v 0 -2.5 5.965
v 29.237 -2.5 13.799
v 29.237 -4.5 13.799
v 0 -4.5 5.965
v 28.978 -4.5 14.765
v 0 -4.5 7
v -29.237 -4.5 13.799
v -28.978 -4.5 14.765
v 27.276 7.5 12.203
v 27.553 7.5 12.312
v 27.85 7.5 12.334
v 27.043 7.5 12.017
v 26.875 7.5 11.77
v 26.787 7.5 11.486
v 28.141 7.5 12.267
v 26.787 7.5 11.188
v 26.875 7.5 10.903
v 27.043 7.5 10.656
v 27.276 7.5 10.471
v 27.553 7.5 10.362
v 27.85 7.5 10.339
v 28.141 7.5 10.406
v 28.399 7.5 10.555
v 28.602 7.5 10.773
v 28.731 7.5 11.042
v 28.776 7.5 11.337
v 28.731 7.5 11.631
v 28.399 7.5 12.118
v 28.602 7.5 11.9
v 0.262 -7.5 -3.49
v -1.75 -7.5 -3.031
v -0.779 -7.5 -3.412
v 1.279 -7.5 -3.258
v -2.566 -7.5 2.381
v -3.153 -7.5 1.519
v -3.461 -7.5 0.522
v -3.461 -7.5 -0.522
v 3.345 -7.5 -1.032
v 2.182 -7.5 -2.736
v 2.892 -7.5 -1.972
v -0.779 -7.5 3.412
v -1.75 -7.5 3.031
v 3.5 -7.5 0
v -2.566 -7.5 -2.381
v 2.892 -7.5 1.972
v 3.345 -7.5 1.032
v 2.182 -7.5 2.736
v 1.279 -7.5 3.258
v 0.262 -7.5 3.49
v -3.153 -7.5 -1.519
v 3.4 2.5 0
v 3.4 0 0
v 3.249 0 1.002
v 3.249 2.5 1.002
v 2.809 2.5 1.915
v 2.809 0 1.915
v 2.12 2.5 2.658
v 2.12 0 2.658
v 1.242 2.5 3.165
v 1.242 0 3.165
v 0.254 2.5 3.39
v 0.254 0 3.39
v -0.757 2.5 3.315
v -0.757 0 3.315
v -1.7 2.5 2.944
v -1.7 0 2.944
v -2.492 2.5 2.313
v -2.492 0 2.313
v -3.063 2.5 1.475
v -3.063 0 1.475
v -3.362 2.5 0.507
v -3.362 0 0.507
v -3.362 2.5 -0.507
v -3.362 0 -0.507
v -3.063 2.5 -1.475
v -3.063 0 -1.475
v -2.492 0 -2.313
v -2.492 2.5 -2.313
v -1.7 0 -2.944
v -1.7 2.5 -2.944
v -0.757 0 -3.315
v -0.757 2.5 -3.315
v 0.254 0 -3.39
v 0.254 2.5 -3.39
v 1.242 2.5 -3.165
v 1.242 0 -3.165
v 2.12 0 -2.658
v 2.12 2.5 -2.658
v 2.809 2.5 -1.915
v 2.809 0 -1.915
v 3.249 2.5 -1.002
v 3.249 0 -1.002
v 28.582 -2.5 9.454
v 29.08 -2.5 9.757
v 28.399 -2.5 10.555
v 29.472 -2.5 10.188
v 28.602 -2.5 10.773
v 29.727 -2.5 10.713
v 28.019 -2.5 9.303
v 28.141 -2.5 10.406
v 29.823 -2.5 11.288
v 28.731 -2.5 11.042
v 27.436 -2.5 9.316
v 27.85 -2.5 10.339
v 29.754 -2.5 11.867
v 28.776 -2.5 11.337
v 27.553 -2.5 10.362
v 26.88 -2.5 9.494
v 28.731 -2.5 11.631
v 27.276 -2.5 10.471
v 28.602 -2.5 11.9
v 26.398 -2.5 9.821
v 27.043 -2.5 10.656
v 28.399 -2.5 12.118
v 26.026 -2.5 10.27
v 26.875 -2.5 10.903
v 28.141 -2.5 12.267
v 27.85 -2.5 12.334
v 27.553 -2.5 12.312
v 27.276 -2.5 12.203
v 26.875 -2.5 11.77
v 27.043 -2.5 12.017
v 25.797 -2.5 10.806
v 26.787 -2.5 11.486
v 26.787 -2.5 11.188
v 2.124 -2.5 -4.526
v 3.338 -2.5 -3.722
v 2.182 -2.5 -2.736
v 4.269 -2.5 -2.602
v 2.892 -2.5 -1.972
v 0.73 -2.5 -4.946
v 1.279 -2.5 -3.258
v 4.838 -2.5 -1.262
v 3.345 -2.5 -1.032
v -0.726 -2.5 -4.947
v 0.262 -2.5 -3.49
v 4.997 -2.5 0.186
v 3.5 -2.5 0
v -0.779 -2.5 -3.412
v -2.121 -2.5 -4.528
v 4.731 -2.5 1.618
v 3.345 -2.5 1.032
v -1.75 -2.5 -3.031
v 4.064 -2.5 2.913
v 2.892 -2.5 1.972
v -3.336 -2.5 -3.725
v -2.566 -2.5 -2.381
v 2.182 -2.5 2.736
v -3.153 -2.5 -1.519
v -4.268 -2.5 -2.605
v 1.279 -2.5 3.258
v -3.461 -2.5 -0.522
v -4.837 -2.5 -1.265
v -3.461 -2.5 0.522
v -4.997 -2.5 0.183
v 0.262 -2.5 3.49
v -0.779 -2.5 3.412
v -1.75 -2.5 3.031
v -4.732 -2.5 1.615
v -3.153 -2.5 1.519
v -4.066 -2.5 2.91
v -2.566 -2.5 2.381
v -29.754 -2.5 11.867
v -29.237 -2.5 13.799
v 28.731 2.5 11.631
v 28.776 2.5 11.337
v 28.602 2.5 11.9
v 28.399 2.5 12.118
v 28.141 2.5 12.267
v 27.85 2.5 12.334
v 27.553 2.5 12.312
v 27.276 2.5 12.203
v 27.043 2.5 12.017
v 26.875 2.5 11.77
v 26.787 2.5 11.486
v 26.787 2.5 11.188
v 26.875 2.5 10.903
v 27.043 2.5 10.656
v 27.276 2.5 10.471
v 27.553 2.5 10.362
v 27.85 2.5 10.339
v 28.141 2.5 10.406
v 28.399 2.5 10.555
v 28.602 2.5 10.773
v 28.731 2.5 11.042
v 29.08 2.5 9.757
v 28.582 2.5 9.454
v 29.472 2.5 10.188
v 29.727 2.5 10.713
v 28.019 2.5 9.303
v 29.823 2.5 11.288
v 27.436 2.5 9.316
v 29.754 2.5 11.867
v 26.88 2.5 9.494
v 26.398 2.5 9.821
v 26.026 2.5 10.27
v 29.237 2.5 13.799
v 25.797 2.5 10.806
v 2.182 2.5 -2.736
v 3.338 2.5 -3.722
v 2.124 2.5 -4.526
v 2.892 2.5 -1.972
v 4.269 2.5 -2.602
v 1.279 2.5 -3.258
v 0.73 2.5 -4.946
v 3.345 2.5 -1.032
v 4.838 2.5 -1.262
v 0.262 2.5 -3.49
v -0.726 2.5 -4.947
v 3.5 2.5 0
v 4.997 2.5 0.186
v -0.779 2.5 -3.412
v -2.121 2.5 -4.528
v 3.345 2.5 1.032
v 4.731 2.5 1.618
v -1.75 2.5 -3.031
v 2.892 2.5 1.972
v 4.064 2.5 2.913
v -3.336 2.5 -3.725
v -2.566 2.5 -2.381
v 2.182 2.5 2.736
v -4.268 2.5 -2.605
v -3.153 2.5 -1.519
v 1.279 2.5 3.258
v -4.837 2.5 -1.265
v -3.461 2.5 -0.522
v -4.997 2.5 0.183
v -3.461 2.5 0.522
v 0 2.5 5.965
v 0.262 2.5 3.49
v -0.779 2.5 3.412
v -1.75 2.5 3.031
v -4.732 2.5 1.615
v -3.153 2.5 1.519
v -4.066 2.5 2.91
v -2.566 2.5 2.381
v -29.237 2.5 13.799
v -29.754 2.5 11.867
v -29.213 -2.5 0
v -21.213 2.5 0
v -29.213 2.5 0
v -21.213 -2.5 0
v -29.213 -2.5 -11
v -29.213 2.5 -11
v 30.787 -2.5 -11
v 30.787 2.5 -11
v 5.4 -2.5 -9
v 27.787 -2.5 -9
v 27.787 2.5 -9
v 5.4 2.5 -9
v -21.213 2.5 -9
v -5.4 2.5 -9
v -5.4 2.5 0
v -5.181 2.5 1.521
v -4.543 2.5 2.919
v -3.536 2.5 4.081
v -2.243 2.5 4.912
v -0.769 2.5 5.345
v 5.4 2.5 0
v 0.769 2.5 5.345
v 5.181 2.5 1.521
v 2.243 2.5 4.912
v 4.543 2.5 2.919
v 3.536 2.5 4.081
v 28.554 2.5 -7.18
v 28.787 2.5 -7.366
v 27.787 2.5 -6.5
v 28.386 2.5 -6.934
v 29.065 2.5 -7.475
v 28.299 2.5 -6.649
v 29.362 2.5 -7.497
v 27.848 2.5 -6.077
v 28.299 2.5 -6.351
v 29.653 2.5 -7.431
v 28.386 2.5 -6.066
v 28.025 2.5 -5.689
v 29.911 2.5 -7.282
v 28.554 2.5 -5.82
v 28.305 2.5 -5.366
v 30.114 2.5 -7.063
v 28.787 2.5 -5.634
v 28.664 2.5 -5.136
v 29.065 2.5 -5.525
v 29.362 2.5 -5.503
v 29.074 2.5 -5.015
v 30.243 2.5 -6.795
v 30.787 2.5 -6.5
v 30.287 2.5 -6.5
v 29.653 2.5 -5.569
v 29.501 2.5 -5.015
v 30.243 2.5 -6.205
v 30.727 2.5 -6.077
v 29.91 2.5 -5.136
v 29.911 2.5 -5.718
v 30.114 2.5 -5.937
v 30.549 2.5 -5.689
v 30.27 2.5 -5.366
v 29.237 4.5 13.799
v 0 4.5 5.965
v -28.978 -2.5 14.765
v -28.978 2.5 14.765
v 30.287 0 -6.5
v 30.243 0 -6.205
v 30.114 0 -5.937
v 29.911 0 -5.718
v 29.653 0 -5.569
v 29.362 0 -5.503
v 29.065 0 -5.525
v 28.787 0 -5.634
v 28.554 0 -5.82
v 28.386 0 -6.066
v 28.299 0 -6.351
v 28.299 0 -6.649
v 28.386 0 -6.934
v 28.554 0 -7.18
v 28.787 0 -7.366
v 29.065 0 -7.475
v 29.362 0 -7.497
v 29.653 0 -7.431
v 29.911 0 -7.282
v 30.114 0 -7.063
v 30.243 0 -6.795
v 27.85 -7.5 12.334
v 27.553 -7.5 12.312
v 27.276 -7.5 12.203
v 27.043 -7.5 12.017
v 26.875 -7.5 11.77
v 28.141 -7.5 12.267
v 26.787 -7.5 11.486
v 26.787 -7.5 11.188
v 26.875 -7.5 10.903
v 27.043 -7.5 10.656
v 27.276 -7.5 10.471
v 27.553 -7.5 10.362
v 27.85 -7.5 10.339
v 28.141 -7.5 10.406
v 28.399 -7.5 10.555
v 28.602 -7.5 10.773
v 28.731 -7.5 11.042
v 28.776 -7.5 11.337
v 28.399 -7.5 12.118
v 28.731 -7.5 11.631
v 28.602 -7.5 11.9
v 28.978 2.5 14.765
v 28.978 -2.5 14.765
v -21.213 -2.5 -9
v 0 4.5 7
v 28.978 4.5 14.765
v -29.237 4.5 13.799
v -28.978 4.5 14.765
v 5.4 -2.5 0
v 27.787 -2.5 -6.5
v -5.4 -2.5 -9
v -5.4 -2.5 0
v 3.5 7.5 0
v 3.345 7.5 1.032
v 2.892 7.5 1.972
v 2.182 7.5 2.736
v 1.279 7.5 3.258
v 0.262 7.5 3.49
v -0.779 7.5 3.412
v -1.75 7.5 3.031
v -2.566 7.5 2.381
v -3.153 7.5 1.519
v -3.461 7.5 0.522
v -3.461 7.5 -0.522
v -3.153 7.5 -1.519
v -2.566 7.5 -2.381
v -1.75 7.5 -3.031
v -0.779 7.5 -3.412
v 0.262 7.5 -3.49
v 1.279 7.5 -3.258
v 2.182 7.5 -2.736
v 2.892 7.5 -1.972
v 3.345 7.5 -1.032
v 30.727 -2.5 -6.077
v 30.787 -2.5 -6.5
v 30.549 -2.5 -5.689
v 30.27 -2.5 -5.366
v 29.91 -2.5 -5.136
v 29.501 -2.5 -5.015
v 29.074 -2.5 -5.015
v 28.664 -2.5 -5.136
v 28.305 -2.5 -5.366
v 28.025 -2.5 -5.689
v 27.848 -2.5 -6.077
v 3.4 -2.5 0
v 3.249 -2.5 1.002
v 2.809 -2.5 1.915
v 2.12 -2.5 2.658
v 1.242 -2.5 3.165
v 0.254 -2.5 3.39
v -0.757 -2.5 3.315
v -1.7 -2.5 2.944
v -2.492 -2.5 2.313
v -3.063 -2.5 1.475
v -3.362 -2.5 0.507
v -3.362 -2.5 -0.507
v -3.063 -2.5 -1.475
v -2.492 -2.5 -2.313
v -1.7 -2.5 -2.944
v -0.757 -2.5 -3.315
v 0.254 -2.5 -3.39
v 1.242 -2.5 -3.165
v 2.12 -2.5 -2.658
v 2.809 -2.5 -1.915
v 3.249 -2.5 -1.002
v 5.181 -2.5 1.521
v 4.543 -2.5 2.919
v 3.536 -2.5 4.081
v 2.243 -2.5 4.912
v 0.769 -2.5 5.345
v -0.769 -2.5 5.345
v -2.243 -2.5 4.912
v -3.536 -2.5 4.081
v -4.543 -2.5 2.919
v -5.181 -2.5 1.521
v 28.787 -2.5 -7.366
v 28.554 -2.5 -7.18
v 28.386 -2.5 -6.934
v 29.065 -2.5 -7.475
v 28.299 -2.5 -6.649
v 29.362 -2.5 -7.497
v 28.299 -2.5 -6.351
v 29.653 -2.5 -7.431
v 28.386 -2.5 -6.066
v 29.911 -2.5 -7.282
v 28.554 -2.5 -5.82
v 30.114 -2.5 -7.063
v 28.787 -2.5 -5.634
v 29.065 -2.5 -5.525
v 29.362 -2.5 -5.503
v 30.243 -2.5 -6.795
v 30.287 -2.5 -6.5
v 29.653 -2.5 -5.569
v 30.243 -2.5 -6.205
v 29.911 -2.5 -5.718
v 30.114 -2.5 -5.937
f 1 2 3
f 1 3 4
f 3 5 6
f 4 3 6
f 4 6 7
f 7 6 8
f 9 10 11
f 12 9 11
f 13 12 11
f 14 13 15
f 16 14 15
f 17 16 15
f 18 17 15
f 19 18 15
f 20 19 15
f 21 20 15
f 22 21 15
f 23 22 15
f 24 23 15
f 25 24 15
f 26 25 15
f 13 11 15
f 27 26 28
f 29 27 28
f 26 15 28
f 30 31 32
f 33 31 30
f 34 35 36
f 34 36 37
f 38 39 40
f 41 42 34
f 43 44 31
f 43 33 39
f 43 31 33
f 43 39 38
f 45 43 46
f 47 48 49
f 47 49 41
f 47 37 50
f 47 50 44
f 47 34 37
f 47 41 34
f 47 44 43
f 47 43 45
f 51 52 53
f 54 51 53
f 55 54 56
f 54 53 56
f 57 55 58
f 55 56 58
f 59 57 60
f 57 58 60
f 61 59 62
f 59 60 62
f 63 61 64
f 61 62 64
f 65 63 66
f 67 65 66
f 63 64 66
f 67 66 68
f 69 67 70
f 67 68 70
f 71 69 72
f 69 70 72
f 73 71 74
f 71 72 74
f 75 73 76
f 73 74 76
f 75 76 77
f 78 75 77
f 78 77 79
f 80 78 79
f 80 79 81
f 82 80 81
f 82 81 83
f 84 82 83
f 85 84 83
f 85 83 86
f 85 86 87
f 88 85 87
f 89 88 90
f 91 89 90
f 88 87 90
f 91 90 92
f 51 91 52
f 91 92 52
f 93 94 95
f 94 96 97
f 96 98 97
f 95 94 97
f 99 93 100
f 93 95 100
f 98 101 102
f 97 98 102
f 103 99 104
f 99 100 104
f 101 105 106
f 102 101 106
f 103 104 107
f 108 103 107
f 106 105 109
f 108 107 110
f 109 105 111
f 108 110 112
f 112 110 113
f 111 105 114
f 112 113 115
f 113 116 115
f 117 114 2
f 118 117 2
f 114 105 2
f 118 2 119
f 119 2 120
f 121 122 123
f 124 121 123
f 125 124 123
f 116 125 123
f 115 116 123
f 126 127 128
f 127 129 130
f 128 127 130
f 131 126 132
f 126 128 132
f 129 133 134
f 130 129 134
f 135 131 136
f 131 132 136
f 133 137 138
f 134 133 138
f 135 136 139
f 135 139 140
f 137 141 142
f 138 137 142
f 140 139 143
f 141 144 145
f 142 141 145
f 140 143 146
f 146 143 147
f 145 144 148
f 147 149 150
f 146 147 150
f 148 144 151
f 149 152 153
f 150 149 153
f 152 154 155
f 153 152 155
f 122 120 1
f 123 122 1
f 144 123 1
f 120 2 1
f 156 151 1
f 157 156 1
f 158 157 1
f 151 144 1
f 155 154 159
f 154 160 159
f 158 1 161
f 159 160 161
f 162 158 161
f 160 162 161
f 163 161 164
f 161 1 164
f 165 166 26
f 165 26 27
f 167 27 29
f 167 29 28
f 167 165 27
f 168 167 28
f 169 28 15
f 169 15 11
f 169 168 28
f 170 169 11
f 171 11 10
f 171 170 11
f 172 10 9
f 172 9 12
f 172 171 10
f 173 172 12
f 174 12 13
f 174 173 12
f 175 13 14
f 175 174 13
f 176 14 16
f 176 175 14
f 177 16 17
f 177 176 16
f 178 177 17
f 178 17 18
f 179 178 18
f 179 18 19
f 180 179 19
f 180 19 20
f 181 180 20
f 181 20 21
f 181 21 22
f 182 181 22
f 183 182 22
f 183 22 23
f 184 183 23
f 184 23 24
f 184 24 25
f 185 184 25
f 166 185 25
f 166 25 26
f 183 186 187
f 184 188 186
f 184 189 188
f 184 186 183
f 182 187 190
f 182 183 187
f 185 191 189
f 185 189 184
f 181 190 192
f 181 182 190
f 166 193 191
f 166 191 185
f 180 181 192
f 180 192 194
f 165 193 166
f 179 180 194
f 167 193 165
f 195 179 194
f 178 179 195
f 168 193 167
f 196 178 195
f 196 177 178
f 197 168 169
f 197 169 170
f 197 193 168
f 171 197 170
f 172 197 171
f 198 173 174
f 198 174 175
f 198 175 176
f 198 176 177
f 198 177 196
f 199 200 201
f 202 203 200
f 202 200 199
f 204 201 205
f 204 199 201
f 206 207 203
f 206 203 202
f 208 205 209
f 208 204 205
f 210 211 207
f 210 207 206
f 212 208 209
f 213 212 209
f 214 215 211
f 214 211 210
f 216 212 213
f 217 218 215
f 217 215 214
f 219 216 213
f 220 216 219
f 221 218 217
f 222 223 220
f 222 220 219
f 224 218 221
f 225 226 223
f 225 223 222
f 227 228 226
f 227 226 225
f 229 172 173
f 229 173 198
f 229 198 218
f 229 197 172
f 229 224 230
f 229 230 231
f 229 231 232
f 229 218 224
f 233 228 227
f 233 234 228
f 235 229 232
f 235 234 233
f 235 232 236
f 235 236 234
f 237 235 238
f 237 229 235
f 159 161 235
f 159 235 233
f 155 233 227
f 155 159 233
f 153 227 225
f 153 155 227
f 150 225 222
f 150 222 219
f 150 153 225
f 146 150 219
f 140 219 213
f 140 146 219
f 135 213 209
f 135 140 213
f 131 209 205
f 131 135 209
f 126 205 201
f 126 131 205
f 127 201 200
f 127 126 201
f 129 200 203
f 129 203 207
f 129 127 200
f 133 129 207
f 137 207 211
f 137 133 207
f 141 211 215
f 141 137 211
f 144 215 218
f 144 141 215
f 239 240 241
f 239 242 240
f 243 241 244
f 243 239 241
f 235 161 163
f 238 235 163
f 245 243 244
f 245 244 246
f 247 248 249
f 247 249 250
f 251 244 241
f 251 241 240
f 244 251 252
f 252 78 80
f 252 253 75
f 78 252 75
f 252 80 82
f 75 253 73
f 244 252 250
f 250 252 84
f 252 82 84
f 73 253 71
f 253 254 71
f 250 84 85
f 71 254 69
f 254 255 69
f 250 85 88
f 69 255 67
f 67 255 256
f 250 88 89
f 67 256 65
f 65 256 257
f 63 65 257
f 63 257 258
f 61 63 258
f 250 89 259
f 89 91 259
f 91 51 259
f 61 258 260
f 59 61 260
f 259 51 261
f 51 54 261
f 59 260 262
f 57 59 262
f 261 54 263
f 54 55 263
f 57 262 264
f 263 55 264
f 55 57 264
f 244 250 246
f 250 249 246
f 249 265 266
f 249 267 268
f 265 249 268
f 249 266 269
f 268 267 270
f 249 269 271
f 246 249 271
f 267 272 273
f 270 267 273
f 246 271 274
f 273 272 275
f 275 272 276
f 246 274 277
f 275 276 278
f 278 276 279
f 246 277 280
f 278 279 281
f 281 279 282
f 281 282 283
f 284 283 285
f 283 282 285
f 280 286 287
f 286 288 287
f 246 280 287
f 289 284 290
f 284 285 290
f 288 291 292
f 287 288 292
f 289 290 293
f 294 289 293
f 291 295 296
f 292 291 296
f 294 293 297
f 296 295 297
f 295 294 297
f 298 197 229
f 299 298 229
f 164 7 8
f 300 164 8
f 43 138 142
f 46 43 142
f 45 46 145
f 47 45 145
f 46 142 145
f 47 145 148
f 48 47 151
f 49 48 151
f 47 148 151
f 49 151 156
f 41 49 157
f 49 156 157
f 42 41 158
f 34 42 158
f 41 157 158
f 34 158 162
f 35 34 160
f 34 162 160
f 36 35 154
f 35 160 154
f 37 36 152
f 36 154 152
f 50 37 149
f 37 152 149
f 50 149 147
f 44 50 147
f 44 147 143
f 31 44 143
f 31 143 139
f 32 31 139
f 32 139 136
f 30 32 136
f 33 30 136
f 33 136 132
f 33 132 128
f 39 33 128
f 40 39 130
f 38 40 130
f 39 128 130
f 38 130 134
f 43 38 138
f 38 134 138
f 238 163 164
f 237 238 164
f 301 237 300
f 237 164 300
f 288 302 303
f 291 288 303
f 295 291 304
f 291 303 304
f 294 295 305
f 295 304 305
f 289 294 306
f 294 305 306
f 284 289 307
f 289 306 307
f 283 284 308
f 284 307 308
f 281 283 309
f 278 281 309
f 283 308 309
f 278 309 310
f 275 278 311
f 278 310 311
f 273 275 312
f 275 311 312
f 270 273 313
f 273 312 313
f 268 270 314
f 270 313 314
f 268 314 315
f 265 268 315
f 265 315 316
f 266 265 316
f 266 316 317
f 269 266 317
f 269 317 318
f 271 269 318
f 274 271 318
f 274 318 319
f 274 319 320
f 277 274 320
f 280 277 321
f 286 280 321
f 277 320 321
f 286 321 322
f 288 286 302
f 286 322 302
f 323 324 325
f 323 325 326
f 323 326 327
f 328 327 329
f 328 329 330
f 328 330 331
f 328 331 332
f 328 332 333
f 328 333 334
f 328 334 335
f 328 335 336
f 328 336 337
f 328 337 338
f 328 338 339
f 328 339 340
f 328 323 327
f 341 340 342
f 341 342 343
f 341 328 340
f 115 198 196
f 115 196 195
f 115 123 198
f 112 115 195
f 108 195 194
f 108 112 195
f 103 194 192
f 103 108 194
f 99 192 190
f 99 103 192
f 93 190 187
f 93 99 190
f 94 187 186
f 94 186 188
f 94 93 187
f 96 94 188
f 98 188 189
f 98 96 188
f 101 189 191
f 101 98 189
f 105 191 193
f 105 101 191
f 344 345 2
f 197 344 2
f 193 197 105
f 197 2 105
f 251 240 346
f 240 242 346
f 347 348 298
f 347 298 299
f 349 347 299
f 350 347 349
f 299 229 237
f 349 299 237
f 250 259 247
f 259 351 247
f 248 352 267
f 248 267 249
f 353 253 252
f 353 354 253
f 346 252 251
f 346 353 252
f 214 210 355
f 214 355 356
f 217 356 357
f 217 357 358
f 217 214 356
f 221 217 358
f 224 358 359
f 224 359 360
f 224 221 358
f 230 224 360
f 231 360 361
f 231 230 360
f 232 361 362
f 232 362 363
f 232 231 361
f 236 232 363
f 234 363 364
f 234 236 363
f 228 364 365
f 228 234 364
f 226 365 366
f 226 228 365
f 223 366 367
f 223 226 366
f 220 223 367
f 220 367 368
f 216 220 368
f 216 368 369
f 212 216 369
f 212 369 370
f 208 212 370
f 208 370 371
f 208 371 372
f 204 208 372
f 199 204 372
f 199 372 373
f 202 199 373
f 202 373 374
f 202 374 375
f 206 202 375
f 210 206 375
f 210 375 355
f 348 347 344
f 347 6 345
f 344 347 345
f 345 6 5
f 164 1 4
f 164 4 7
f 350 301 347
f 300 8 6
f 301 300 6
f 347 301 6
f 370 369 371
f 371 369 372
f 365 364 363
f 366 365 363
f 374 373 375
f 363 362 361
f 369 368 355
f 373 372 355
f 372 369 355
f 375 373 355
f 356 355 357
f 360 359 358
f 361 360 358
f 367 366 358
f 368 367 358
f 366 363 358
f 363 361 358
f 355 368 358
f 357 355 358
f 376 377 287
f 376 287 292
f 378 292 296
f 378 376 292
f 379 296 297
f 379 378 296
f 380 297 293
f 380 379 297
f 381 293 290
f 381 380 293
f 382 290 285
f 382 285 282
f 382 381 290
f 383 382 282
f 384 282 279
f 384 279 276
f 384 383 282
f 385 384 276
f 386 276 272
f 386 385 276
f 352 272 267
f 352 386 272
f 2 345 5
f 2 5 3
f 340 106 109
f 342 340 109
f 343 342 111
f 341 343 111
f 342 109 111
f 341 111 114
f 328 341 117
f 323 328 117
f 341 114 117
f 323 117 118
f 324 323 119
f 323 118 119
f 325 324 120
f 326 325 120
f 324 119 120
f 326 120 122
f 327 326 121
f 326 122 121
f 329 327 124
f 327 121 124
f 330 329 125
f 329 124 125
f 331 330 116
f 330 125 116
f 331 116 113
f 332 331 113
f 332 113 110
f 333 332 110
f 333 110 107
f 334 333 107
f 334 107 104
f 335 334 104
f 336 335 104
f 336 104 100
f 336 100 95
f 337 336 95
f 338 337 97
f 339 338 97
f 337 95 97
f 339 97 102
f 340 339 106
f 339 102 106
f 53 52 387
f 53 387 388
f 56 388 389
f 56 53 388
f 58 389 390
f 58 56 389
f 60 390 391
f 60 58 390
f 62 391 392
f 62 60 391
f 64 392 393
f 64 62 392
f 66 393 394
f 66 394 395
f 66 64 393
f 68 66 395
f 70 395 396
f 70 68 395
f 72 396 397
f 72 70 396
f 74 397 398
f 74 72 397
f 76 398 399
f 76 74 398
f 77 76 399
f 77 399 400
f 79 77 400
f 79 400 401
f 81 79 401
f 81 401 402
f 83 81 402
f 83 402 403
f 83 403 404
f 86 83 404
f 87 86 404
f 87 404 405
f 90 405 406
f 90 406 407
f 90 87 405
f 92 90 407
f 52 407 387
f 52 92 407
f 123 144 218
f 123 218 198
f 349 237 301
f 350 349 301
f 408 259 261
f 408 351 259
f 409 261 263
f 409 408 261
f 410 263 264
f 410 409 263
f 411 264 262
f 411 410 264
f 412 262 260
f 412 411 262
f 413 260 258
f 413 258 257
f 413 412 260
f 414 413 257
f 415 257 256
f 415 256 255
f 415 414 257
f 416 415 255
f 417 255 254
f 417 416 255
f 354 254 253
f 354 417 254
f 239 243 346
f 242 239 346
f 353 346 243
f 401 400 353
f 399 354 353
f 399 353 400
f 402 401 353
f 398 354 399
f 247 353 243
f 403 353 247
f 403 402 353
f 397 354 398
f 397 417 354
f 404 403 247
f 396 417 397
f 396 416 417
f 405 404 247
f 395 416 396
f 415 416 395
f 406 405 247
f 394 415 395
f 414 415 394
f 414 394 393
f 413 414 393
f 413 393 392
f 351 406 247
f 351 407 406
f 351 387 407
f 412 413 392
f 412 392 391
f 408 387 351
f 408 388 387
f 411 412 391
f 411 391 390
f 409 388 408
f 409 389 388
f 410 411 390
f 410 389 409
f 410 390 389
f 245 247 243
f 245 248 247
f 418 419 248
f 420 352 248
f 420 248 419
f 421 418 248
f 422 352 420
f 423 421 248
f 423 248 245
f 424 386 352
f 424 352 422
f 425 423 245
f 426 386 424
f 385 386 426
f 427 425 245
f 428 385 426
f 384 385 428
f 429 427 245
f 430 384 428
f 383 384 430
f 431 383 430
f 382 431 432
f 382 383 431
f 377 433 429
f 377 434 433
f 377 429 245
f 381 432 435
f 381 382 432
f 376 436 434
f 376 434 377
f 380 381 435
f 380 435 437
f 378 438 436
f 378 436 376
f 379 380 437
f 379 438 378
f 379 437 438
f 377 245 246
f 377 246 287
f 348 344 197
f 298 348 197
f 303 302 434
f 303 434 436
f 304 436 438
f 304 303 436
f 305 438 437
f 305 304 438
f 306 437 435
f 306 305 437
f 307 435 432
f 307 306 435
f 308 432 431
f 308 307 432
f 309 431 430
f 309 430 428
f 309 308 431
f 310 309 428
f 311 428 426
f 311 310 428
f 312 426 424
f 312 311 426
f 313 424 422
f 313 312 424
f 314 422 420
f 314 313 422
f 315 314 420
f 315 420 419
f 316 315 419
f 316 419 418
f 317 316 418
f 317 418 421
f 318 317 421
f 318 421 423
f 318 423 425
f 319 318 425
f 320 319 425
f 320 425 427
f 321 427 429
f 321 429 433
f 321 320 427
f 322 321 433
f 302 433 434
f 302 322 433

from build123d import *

# Parameters (mm, degrees)
SKETCH006_R       = 3.4
SKETCH006_R_2     = 1.000007
PAD003_DEPTH      = 2.5
PAD003_DEPTH_BACK = 2.5
PAD_DEPTH         = 2.5
PAD_DEPTH_BACK    = 2.5
SKETCH002_R       = 3.5
SKETCH002_R_2     = 1
PAD001_DEPTH      = 5
PAD001_DEPTH_BACK = 10
PAD002_DEPTH      = 2
PAD002_DEPTH_BACK = 7


with BuildPart() as body:
    # Sketch006 → Pad003 (new body, two sides)
    with BuildSketch(Plane.XZ) as pad003_sk:
        with BuildLine():
            Line((-29.212631, 0), (-29.212631, -11))
            Line((-29.212631, -11), (30.787369, -11))
            Line((30.787369, -11), (30.787369, -6.5))
            ThreePointArc((30.787369, -6.5), (29.287369, -5), (27.787369, -6.5))
            Line((27.787369, -6.5), (27.787369, -9))
            Line((27.787369, -9), (5.4, -9))
            Line((5.4, 0), (5.4, -9))
            ThreePointArc((5.4, 0), (0, 5.4), (-5.4, 0))
            Line((-5.4, 0), (-5.4, -9))
            Line((-5.4, -9), (-21.212631, -9))
            Line((-21.212631, 0), (-21.212631, -9))
            Line((-21.212631, 0), (-29.212631, 0))
        make_face()
        Circle(SKETCH006_R, mode=Mode.SUBTRACT)
        with Locations((29.287369, -6.5)):
            Circle(SKETCH006_R_2, mode=Mode.SUBTRACT)
    extrude(amount=PAD003_DEPTH)
    extrude(pad003_sk.sketch, amount=-PAD003_DEPTH_BACK)


with BuildPart() as body001:
    # Sketch001 → Pad (new body, two sides)
    with BuildSketch(Plane.XZ) as pad_sk:
        with BuildLine():
            Line((-29.754232, 11.866794), (-28.977775, 14.764571))
            Line((-28.977775, 14.764571), (0, 7))
            Line((0, 7), (28.977775, 14.764571))
            Line((28.977775, 14.764571), (29.754232, 11.866794))
            ThreePointArc((25.796873, 10.806423), (28.305738, 9.357929), (29.754232, 11.866794))
            Line((4.06409, 2.912589), (25.796873, 10.806423))
            ThreePointArc((-4.066107, 2.909773), (0.001732, -5), (4.06409, 2.912589))
            Line((-4.066107, 2.909773), (-29.754232, 11.866794))
        make_face()
    extrude(amount=PAD_DEPTH)
    extrude(pad_sk.sketch, amount=-PAD_DEPTH_BACK)

    # Sketch002 (on Face10 of Pad) → Pad001 (join, two sides)
    with BuildSketch(Plane.XZ.offset(2.5)) as pad001_sk:
        Circle(SKETCH002_R)
        with Locations((27.775552, 11.336608)):
            Circle(SKETCH002_R_2)
    extrude(amount=PAD001_DEPTH)
    extrude(pad001_sk.sketch, amount=-PAD001_DEPTH_BACK)

    # Sketch004 (on Face5 of Pad001) → Pad002 (join, two sides)
    with BuildSketch(Plane.XZ.offset(2.5)) as pad002_sk:
        Polygon((0, 7), (28.977775, 14.764571), (29.236594, 13.798646), (0, 5.964724), (-29.236594, 13.798646), (-28.977775, 14.764571), align=None)
    extrude(amount=PAD002_DEPTH)
    extrude(pad002_sk.sketch, amount=-PAD002_DEPTH_BACK)


solid = Compound([body.part, body001.part])
